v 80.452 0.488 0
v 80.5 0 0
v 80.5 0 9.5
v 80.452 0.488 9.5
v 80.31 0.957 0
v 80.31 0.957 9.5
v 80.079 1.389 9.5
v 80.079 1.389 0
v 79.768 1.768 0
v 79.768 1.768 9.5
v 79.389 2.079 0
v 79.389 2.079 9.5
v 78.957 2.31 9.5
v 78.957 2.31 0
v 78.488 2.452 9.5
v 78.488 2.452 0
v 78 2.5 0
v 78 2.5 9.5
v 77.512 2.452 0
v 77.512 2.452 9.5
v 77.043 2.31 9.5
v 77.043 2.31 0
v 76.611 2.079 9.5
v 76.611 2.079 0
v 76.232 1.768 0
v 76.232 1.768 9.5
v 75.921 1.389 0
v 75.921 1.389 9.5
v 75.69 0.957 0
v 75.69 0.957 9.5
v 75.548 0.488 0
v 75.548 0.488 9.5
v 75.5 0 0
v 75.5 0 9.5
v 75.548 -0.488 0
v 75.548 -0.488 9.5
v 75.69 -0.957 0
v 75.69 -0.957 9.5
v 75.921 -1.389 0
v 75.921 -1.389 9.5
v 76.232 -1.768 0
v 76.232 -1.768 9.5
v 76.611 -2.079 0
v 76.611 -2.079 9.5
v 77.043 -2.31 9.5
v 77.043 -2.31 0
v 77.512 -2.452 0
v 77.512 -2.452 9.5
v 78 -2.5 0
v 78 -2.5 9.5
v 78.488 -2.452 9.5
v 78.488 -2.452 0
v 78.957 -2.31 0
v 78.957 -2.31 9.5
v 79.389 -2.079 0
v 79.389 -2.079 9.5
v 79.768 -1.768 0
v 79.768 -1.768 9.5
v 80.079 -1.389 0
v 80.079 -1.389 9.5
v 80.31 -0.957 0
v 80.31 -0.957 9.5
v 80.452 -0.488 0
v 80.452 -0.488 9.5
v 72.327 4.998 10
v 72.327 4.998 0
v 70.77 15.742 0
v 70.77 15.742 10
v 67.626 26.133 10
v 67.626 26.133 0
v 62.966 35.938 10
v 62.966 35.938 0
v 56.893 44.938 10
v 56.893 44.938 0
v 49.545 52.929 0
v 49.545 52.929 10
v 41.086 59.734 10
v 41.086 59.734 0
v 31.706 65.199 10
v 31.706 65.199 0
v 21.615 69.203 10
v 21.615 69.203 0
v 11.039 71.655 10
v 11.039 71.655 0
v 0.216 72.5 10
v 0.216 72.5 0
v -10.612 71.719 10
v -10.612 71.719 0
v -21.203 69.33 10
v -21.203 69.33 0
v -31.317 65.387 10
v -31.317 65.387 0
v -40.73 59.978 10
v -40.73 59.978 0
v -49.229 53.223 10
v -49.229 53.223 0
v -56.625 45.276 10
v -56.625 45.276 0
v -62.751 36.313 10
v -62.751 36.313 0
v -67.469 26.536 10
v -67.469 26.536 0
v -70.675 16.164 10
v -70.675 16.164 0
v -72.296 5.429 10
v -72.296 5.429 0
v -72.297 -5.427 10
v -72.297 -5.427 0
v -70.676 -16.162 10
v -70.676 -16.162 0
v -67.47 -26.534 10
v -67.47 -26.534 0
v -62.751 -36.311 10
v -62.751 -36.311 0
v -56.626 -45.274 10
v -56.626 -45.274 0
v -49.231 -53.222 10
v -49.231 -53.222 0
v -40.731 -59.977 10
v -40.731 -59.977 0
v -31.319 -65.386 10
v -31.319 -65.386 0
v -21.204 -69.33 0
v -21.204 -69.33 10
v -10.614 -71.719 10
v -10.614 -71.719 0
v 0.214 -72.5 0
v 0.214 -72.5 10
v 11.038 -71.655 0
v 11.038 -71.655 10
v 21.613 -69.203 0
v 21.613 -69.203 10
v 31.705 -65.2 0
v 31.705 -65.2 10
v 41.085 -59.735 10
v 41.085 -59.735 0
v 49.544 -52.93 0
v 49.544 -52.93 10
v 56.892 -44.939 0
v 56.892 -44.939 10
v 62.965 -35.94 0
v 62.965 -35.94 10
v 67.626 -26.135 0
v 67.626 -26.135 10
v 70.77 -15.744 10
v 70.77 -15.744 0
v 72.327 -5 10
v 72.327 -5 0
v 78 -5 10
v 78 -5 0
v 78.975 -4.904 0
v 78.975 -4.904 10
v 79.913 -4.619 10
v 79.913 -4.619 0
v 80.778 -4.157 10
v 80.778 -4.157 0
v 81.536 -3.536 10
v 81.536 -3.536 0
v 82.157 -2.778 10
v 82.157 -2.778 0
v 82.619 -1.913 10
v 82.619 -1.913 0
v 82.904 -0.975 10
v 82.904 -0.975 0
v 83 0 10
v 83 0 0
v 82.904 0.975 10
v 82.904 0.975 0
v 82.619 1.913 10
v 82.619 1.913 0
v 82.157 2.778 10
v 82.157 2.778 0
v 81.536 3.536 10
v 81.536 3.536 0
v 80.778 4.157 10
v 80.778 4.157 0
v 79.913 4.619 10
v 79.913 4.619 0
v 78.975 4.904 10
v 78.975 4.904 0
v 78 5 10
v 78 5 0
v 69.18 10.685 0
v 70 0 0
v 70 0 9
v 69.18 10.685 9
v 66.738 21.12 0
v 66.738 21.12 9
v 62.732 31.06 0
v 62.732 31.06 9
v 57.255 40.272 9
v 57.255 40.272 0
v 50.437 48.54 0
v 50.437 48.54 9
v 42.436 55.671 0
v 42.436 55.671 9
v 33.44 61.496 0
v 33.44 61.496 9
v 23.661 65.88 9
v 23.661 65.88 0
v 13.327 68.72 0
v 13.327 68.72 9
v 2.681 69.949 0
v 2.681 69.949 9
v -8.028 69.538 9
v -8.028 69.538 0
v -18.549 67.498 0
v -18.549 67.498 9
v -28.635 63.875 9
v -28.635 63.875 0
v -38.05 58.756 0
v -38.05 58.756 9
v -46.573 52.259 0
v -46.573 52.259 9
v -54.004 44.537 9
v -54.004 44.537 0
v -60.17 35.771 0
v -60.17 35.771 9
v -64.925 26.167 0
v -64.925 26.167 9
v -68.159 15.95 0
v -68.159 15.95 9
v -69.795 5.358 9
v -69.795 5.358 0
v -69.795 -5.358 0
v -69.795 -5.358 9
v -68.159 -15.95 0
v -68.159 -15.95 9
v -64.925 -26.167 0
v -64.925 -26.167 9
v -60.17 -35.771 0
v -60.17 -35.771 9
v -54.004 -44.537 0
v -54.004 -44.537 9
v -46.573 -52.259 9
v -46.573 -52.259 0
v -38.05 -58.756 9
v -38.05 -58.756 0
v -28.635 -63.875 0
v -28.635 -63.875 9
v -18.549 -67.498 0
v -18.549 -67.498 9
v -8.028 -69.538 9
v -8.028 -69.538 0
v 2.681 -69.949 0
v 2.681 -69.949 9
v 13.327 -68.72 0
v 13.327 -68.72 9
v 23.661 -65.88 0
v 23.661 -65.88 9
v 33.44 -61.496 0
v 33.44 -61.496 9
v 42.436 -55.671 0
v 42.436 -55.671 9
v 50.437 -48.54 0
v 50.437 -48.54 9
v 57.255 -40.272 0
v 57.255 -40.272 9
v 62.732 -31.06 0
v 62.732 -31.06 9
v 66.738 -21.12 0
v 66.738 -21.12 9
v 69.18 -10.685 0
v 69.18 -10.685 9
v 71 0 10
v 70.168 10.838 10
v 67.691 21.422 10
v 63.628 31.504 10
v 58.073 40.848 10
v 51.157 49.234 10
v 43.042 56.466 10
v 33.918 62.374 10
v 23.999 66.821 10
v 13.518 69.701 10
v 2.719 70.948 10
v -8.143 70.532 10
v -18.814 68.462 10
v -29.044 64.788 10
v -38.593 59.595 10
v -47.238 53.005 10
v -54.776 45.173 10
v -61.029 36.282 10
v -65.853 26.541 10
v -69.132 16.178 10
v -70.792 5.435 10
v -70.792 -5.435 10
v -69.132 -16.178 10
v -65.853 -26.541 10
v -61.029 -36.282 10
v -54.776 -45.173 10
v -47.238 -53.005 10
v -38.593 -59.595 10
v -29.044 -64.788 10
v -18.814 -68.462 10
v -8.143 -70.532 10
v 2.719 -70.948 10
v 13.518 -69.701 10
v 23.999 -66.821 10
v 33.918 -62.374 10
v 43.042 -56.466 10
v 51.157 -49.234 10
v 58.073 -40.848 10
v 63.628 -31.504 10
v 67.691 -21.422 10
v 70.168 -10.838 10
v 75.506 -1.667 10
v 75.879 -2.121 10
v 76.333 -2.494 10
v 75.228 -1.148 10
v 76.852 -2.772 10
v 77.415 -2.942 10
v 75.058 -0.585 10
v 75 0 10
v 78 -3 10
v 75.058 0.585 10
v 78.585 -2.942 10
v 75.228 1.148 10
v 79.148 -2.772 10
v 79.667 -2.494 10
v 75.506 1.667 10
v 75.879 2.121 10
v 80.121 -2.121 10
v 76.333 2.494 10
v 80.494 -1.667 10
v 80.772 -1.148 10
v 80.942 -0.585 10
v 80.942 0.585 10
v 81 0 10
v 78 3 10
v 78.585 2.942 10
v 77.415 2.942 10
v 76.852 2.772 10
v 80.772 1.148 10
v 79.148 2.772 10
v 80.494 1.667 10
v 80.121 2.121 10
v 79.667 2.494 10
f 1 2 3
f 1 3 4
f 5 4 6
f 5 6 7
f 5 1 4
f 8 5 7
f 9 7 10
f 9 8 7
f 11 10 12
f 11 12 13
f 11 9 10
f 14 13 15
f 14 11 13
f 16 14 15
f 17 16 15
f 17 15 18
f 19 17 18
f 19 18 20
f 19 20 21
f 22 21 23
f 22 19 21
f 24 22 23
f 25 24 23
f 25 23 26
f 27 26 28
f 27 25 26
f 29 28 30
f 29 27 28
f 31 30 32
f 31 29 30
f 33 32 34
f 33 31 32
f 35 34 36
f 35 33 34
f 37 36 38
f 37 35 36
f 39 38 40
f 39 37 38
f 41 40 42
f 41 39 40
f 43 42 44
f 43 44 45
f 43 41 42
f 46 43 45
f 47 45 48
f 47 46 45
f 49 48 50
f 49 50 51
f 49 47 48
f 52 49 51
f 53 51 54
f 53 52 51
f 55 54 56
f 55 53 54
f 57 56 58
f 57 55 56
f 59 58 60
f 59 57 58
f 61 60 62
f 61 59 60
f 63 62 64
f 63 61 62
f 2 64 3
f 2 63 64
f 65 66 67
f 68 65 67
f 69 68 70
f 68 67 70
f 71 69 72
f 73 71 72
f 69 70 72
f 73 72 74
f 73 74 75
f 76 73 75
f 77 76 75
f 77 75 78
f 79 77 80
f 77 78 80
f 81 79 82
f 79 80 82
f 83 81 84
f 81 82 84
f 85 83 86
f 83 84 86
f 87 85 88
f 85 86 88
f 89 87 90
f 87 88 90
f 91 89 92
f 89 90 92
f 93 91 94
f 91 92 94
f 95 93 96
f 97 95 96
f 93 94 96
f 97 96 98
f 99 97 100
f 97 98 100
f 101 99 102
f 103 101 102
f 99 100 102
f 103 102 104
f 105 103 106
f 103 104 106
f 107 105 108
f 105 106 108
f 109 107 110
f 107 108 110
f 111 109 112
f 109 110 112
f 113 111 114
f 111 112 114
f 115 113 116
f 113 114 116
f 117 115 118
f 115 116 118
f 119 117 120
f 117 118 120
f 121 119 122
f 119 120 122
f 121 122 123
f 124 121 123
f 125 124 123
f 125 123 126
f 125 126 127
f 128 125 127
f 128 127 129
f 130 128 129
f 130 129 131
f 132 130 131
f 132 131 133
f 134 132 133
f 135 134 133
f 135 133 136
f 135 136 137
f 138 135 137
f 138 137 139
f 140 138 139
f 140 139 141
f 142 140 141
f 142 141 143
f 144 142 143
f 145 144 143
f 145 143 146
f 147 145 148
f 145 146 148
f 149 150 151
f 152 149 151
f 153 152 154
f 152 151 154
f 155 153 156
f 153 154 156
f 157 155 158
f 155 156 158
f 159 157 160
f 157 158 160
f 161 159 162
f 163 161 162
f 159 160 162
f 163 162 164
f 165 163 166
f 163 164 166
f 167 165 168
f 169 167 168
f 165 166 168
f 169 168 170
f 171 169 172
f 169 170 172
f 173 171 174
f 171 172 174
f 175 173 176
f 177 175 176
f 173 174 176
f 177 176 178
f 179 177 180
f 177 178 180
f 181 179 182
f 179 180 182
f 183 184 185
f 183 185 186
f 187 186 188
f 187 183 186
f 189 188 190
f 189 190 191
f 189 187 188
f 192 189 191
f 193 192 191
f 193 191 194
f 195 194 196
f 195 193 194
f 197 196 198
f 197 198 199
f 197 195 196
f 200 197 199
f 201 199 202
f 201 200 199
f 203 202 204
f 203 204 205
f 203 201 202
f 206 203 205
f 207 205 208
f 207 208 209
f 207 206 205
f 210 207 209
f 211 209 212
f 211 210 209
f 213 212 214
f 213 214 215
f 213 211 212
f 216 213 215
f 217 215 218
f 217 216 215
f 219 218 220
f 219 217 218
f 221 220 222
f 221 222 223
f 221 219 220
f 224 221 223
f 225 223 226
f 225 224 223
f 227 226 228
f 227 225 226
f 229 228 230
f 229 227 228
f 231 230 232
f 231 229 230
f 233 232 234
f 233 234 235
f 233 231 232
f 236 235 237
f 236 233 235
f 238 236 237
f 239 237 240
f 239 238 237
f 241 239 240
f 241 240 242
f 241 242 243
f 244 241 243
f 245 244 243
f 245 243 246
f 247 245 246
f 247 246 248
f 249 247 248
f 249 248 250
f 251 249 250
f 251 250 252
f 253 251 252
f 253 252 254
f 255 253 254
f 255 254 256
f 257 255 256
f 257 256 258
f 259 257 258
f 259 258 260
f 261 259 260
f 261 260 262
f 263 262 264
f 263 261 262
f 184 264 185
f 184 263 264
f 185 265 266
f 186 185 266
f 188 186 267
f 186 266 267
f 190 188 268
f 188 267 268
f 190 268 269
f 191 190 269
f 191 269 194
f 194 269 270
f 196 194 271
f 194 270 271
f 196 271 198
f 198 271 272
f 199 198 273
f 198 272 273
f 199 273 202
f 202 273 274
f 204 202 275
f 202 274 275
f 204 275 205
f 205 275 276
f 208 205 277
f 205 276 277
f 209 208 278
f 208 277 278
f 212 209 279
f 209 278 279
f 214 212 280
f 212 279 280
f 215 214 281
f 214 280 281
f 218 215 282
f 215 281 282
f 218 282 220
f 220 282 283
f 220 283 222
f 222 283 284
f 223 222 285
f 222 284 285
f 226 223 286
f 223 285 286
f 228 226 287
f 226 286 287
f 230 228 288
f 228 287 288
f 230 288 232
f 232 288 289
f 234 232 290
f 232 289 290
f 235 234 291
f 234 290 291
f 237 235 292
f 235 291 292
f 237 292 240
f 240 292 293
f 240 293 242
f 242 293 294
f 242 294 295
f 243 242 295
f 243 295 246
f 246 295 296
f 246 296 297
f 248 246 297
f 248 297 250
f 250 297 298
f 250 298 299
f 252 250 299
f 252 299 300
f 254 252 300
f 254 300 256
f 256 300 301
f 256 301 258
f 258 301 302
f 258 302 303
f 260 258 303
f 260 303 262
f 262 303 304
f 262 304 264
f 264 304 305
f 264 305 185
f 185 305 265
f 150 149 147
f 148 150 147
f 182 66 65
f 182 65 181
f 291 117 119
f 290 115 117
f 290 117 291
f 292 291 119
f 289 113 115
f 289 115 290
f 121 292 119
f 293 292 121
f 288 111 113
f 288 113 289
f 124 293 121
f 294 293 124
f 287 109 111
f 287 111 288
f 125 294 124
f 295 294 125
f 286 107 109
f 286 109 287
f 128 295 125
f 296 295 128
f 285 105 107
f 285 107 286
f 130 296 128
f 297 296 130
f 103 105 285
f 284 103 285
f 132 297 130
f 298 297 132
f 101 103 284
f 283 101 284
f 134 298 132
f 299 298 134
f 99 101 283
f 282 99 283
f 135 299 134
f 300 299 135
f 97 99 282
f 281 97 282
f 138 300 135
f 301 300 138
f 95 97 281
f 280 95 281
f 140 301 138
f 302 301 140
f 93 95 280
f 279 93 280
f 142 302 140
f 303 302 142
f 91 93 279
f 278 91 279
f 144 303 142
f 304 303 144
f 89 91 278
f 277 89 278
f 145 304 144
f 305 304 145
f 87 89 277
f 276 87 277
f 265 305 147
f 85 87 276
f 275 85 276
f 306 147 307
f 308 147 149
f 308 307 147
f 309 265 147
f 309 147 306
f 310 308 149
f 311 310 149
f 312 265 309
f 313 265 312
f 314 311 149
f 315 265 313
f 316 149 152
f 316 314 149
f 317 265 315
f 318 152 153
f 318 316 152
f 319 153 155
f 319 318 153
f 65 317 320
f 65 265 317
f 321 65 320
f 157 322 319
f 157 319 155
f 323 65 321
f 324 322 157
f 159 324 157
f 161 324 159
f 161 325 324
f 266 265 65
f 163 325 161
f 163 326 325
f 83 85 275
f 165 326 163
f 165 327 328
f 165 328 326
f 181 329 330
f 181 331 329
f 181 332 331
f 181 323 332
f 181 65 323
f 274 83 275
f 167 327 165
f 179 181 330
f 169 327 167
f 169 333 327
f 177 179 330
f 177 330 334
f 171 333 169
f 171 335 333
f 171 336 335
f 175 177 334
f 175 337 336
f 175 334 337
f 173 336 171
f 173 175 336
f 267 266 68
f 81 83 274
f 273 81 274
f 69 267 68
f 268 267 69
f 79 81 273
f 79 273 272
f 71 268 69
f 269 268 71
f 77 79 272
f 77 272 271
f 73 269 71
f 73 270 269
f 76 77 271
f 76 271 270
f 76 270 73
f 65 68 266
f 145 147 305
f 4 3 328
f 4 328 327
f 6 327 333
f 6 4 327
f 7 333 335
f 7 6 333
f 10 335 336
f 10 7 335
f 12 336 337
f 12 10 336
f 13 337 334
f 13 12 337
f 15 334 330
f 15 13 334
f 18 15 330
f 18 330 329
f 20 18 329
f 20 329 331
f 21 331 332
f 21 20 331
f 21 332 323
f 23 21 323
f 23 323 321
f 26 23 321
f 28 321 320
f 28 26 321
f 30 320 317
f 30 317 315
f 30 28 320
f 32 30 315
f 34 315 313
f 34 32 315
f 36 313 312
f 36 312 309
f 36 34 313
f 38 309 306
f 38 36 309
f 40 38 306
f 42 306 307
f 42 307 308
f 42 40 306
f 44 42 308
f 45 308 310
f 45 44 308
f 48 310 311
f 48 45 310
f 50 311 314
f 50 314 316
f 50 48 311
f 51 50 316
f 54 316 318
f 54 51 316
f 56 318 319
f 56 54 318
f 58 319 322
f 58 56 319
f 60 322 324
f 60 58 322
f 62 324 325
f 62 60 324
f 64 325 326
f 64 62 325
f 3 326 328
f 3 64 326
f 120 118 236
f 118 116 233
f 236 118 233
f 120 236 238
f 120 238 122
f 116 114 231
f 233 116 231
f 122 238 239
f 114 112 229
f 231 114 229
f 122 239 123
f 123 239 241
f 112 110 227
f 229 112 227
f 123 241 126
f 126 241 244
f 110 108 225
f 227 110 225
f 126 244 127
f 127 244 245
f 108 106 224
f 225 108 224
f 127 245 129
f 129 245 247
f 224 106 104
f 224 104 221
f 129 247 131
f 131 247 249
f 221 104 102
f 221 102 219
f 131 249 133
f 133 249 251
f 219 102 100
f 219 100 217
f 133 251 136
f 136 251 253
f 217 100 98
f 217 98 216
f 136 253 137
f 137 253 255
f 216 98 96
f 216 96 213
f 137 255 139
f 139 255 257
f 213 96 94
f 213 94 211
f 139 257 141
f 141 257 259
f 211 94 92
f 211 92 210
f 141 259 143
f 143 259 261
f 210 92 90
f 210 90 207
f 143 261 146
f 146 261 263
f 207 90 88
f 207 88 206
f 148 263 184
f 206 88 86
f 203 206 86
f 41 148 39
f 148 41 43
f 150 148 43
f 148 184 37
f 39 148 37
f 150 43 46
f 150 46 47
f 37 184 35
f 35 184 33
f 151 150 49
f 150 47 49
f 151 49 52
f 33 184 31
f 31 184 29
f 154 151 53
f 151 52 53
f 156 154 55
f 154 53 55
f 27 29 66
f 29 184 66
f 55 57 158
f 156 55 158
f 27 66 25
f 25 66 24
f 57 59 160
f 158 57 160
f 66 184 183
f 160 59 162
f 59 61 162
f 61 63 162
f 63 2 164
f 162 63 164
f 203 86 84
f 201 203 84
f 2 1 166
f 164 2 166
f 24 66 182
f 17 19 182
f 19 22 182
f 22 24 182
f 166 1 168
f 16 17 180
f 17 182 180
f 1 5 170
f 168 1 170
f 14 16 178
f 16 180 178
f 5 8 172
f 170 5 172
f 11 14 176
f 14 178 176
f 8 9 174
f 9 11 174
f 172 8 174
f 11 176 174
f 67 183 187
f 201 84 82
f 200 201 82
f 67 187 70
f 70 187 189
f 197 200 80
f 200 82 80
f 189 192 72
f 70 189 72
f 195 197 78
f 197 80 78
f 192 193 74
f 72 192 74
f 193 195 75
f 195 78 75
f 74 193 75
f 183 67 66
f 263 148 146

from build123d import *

# Parameters (mm, degrees)
SKETCH_R        = 70
SKETCH_R_2      = 2.5
PAD_DEPTH       = 10
CHAMFER_SIZE    = 1
CHAMFER001_SIZE = 0.5


with BuildPart() as part:
    # Sketch → Pad (new body)
    with BuildSketch(Plane.XY):
        with BuildLine():
            ThreePointArc((72.327497, 4.998325), (-72.5, 0.00084), (72.327381, -5))
            Line((78, -5), (72.327381, -5))
            ThreePointArc((78, -5), (83, 0), (78, 5))
            Line((72.327497, 4.998325), (78, 5))
        make_face()
        Circle(SKETCH_R, mode=Mode.SUBTRACT)
        with Locations((78, 0)):
            Circle(SKETCH_R_2, mode=Mode.SUBTRACT)
    extrude(amount=PAD_DEPTH)

    # Chamfer
    chamfer_edges = [part.edges().sort_by_distance(p)[0] for p in [
        (-70, 0, 10),
    ]]
    chamfer(chamfer_edges, length=CHAMFER_SIZE)

    # Chamfer001
    chamfer001_edges = [part.edges().sort_by_distance(p)[0] for p in [
        (75.5, 0, 10),
    ]]
    chamfer(chamfer001_edges, length=CHAMFER001_SIZE)


solid = part.part
